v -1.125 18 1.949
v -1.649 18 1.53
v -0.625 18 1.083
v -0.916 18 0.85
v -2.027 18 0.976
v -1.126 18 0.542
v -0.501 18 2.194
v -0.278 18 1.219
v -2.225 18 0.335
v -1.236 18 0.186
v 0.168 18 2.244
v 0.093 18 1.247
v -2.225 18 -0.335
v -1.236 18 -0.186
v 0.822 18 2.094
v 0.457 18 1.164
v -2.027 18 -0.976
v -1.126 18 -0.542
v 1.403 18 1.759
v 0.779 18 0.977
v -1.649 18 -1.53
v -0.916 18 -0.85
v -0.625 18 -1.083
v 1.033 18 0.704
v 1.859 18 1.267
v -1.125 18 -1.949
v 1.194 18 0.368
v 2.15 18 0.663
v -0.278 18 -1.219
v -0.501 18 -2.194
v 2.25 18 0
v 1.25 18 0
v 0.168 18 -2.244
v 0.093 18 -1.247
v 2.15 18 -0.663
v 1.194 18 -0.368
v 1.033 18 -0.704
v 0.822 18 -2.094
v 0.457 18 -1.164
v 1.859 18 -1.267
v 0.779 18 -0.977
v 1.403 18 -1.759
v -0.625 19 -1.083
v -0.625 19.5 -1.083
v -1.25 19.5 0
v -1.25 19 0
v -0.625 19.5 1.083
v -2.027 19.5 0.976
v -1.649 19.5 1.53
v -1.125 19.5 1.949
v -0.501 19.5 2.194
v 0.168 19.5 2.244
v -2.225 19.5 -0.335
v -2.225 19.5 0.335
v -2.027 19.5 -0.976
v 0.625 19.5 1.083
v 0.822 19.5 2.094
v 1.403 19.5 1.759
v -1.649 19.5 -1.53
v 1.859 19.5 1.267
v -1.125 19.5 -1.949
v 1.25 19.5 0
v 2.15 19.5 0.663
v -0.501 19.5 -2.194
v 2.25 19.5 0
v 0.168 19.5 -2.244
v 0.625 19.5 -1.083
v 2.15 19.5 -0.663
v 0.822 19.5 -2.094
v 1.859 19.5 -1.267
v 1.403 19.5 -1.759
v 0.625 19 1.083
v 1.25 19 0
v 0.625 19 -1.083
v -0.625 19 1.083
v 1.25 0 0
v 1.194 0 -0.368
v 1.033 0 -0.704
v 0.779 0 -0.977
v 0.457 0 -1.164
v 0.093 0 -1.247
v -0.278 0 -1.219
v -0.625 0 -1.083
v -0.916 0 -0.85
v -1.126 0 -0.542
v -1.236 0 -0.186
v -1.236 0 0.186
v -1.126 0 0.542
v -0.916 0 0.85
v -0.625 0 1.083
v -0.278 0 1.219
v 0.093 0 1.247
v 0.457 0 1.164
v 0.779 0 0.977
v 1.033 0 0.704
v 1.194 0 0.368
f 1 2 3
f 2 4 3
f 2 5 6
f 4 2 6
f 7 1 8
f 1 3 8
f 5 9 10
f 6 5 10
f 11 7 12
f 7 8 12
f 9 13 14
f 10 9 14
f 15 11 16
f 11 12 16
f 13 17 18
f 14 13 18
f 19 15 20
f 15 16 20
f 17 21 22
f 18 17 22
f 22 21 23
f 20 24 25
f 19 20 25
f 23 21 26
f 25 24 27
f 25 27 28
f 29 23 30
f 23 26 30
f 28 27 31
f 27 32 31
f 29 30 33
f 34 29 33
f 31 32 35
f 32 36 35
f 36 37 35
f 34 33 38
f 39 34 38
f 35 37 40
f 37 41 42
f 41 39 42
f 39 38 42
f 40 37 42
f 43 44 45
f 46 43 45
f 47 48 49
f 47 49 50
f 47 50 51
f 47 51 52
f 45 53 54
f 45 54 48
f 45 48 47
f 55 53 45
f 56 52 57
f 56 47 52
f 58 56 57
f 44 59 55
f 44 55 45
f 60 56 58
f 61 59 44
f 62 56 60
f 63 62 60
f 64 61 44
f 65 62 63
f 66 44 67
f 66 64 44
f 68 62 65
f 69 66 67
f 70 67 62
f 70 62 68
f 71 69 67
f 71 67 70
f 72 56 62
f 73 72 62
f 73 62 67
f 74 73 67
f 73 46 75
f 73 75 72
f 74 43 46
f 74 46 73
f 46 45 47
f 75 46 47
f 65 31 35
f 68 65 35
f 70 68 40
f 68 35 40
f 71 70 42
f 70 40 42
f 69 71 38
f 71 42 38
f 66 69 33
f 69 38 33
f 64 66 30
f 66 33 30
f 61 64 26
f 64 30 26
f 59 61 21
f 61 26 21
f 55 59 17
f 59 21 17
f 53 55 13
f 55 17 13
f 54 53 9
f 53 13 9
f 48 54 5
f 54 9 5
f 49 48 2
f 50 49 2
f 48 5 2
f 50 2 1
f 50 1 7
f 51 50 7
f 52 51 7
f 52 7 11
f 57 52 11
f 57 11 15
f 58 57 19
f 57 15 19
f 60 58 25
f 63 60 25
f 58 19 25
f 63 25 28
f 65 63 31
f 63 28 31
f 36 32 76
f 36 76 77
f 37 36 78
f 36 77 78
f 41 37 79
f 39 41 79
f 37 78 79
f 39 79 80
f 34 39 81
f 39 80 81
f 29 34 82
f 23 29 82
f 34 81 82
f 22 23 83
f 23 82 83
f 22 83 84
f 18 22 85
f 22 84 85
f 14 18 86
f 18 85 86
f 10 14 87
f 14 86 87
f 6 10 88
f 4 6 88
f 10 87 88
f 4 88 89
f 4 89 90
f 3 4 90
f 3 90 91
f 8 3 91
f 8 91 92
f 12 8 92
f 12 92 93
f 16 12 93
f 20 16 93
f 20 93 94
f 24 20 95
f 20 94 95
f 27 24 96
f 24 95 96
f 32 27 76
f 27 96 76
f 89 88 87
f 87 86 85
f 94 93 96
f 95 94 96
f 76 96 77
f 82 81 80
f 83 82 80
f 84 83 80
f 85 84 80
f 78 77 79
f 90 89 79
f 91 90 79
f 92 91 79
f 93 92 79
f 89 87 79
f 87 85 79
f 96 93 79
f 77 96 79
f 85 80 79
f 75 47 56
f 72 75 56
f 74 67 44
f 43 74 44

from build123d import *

# Parameters (mm, degrees)
SKETCH1_R           = 1.25
BOSS_EXTRUDE1_DEPTH = 18
SKETCH4_R           = 2.25
BOSS_EXTRUDE2_DEPTH = 1.5
CUT_EXTRUDE1_DEPTH  = 0.5


with BuildPart() as part:
    # Sketch1 → Boss-Extrude1 (new body)
    with BuildSketch(Plane(origin=(0, 0, 0), x_dir=(1, 0, 0), z_dir=(0, 1, 0))):
        Circle(SKETCH1_R)
    extrude(amount=BOSS_EXTRUDE1_DEPTH)

    # Sketch4 → Boss-Extrude2 (add)
    with BuildSketch(Plane(origin=(0, 18, 0), x_dir=(1, 0, 0), z_dir=(0, 1, 0))):
        Circle(SKETCH4_R)
    extrude(amount=BOSS_EXTRUDE2_DEPTH)

    # Sketch5 → Cut-Extrude1 (cut)
    with BuildSketch(Plane(origin=(0, 19.5, 0), x_dir=(1, 0, 0), z_dir=(0, 1, 0))):
        Polygon((1.25, 0), (0.625, 1.082531755), (-0.625, 1.082531755), (-1.25, 0), (-0.625, -1.082531755), (0.625, -1.082531755), align=None)
    extrude(amount=-CUT_EXTRUDE1_DEPTH, mode=Mode.SUBTRACT)


solid = part.part
